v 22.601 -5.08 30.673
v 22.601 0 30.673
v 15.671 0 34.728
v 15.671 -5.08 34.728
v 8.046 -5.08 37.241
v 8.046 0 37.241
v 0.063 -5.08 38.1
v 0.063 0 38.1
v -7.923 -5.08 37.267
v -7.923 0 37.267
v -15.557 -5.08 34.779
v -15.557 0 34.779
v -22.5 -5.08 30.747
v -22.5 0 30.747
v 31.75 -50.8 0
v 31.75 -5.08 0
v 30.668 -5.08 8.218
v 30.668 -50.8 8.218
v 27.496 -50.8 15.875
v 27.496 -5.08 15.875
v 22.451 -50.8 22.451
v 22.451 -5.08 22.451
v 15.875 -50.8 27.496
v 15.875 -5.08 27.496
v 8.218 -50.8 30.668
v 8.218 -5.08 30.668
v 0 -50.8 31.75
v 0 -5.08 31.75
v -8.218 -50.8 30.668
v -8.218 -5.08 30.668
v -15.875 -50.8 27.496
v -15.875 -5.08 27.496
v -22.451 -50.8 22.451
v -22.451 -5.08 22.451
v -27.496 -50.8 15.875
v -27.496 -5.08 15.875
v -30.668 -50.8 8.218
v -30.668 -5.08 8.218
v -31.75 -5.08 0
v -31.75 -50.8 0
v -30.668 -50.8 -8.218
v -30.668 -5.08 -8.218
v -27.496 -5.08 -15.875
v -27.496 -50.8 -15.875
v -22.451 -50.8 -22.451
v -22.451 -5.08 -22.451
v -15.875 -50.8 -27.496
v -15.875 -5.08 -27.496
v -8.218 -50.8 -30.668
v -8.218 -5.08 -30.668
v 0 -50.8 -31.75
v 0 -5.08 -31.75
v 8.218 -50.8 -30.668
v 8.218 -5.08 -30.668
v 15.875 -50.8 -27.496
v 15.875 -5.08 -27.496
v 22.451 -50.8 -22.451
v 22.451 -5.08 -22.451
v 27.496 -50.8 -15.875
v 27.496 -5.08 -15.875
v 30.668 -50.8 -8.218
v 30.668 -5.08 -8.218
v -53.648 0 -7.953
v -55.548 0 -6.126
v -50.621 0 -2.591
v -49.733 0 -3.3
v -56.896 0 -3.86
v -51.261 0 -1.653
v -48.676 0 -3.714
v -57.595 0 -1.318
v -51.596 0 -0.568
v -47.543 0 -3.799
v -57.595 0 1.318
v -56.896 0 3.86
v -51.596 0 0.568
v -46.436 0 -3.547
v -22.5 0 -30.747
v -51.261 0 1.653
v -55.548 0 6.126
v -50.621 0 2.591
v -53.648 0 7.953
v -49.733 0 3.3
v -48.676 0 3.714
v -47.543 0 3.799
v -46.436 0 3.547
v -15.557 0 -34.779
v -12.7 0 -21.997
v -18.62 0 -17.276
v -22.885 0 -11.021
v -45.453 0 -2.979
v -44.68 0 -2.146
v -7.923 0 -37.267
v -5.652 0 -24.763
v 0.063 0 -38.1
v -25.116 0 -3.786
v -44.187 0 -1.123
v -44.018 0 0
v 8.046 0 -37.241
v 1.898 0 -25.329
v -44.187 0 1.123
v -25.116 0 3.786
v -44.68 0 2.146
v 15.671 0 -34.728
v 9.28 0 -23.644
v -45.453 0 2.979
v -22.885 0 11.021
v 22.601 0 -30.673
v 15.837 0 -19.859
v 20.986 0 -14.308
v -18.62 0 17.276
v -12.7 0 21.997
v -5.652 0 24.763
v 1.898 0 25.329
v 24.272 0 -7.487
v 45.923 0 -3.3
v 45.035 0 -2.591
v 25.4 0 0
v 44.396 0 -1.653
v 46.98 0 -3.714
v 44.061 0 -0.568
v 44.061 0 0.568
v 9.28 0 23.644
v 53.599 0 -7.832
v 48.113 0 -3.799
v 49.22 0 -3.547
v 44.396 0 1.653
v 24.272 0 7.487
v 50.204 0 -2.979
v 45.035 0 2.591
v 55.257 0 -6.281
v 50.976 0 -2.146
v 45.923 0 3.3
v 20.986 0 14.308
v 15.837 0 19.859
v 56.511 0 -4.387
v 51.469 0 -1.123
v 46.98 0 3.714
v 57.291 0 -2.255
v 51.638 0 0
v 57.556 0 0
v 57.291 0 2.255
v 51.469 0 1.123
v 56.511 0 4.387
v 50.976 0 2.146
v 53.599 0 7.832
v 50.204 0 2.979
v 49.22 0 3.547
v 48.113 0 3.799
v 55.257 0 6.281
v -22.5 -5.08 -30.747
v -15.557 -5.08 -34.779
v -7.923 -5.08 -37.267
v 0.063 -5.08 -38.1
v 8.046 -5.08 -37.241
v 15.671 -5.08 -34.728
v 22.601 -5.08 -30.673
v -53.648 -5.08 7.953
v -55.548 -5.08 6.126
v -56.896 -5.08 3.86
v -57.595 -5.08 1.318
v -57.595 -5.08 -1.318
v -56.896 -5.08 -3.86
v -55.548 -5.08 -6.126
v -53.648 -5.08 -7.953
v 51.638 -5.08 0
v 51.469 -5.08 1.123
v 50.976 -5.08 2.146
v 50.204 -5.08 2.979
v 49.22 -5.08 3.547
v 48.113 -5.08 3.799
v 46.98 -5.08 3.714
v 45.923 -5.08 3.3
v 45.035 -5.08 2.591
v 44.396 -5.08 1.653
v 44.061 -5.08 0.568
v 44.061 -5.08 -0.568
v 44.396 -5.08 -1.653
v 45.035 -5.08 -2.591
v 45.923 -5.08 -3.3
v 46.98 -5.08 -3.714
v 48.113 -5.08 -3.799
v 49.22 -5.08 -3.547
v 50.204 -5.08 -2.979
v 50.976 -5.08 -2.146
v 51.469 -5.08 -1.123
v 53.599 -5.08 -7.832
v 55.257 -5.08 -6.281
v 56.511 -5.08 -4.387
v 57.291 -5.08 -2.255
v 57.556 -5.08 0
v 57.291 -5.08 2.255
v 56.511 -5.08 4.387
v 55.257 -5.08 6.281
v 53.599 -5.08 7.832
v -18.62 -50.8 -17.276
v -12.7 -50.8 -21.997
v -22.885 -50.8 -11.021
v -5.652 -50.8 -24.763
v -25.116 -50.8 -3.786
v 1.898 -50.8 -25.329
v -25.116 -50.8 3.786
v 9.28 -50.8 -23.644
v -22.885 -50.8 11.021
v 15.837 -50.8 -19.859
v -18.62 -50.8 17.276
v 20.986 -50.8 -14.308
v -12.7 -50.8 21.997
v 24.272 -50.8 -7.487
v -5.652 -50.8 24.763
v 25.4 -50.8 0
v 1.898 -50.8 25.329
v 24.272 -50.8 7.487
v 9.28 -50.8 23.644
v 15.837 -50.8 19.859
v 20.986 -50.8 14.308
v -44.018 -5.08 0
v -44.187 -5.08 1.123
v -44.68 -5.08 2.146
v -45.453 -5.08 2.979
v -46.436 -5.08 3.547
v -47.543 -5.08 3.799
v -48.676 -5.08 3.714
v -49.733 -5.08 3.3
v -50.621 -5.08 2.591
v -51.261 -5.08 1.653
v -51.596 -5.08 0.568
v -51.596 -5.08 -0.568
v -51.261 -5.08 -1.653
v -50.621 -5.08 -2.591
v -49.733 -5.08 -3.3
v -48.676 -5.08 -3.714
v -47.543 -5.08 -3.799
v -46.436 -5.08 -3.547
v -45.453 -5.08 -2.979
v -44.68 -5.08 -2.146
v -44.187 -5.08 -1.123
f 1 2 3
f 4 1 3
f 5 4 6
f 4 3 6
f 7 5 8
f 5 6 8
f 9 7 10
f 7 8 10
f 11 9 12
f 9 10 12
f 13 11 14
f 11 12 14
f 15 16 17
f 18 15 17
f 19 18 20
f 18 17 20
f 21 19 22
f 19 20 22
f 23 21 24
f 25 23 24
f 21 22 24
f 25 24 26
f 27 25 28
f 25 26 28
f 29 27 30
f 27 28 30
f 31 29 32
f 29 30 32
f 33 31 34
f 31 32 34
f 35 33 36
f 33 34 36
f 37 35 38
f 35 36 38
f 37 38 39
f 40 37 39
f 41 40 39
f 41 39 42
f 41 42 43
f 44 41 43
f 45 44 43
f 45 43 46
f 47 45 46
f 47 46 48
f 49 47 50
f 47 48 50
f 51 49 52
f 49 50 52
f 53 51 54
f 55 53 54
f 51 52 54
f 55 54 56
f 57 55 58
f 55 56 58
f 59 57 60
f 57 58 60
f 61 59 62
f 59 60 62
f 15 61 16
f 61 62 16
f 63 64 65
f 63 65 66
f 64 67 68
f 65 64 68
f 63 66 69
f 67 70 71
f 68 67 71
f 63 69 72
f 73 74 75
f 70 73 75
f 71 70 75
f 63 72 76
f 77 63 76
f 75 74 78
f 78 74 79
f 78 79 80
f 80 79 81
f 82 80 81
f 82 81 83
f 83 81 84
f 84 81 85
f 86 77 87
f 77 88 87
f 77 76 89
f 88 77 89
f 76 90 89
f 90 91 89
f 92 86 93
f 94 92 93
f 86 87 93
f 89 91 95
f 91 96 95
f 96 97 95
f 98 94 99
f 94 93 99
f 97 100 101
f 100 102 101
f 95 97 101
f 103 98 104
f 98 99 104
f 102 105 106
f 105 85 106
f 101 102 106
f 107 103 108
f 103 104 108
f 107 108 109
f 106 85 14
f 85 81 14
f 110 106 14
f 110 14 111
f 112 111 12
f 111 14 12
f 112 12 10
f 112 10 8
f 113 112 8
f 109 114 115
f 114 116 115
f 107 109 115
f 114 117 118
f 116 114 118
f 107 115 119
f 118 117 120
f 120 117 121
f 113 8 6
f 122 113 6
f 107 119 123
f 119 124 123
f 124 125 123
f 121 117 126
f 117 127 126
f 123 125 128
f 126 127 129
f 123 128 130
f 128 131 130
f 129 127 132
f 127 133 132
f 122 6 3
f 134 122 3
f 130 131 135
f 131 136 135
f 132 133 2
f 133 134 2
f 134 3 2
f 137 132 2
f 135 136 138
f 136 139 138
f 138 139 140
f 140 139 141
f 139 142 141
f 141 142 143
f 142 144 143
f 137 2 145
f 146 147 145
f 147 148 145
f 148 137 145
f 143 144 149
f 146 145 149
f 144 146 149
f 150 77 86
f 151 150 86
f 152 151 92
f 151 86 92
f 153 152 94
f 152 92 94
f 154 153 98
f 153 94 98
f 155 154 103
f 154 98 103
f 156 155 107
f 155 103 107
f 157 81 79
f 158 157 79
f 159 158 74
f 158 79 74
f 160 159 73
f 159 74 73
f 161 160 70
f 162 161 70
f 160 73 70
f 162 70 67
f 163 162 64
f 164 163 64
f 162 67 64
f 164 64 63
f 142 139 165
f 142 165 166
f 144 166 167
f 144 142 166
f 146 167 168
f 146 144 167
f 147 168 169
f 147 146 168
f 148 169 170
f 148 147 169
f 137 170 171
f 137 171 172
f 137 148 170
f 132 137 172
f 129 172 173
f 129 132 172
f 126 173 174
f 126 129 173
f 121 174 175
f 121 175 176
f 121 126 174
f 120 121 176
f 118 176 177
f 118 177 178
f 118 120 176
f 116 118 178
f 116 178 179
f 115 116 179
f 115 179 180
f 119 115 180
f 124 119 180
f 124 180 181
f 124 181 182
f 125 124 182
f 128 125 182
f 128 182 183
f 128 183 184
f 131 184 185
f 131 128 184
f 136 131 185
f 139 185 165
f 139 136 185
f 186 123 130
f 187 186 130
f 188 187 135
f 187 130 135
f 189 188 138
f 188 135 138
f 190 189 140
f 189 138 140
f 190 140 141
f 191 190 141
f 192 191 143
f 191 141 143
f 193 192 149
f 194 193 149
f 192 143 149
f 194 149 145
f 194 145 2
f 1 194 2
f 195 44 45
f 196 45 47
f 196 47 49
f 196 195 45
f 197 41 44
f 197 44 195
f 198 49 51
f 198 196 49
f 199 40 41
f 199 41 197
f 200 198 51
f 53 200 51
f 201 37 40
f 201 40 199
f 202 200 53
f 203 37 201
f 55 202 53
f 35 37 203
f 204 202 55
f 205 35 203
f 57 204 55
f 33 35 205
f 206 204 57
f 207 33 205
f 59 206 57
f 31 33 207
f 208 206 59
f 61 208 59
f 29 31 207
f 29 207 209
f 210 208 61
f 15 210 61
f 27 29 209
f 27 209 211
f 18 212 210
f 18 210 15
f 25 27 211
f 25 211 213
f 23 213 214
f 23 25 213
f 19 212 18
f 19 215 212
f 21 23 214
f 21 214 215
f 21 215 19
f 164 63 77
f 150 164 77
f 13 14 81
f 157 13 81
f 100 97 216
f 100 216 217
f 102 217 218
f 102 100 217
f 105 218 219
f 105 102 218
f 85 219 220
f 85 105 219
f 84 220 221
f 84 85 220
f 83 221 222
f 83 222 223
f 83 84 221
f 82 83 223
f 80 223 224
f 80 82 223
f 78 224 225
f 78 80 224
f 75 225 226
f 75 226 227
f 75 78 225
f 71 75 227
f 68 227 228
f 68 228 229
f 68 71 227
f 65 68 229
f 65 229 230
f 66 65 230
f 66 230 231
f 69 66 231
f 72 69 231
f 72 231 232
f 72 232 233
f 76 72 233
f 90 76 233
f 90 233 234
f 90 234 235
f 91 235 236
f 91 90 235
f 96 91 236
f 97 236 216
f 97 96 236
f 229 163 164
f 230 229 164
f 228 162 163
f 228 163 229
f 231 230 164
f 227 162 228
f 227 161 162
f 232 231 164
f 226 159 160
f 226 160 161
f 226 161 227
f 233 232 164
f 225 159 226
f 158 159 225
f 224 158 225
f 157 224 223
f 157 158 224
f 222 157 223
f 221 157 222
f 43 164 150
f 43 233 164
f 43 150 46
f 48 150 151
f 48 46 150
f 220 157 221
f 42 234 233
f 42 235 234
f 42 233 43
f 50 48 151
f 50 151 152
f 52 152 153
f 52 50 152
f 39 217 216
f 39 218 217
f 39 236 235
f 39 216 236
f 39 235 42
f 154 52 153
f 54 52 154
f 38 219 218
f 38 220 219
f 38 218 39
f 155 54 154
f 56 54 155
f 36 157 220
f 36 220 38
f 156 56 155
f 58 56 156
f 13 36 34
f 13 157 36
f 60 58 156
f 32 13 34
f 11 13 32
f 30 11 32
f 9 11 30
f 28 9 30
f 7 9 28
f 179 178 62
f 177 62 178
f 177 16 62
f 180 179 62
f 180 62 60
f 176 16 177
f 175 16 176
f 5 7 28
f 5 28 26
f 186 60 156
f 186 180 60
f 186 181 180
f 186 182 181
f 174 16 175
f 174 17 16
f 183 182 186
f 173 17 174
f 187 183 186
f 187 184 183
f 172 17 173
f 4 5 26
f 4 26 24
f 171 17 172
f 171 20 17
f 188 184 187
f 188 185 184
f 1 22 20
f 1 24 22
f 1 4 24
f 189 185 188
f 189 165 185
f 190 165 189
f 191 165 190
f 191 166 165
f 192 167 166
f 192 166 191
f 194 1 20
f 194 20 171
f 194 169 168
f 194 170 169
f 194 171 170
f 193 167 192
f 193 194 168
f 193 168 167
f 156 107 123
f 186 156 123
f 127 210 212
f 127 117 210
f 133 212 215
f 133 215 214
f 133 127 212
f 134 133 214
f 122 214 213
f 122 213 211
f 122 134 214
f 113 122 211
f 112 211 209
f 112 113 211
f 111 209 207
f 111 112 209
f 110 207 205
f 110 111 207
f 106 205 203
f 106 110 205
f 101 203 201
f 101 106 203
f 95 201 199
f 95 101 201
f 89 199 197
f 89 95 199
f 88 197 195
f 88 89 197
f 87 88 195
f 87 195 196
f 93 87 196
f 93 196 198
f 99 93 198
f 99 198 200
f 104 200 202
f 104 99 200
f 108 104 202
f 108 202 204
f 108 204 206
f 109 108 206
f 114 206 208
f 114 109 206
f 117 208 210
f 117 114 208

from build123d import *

# Parameters (mm, degrees)
F0_R     = 3.81
F0_R_2   = 31.75
F0_R_3   = 25.4
F1_DEPTH = 5.08
F2_R     = 31.75
F2_R_2   = 25.4
F3_DEPTH = 45.72


with BuildPart() as f1:
    # F0 (on Front) → F1 (new body)
    with BuildSketch(Plane.XZ):
        with BuildLine():
            Line((-22.499841, 30.746824), (-53.648159, 7.953178))
            ThreePointArc((-53.648159, 7.953178), (-57.6834, 0), (-53.648159, -7.953178))
            Line((-53.648159, -7.953178), (-22.499841, -30.746824))
            ThreePointArc((-22.499841, -30.746824), (0.062757, -38.099948), (22.601009, -30.672535))
            Line((22.601009, -30.672535), (53.598991, -7.831721))
            ThreePointArc((53.598991, -7.831721), (38.1, 0), (53.598991, 7.831721))
            Line((53.598991, 7.831721), (22.601009, 30.672535))
            ThreePointArc((22.601009, 30.672535), (0.062757, 38.099948), (-22.499841, 30.746824))
        make_face()
        with Locations((-47.8282, 0)):
            Circle(F0_R, mode=Mode.SUBTRACT)
        Circle(F0_R_2, mode=Mode.SUBTRACT)
        Circle(F0_R_2)
        Circle(F0_R_3, mode=Mode.SUBTRACT)
        with BuildLine():
            ThreePointArc((57.5564, 0), (56.510863, 4.387395), (53.598991, 7.831721))
            ThreePointArc((53.598991, 7.831721), (38.1, 0), (53.598991, -7.831721))
            ThreePointArc((53.598991, -7.831721), (56.510863, -4.387395), (57.5564, 0))
        make_face()
        with Locations((47.8282, 0)):
            Circle(F0_R, mode=Mode.SUBTRACT)
    extrude(amount=F1_DEPTH)

    # F2 (on face) → F3 (join)
    with BuildSketch(Plane.XZ.offset(5.08)):
        Circle(F2_R)
        Circle(F2_R_2, mode=Mode.SUBTRACT)
    extrude(amount=F3_DEPTH)


solid = f1.part
